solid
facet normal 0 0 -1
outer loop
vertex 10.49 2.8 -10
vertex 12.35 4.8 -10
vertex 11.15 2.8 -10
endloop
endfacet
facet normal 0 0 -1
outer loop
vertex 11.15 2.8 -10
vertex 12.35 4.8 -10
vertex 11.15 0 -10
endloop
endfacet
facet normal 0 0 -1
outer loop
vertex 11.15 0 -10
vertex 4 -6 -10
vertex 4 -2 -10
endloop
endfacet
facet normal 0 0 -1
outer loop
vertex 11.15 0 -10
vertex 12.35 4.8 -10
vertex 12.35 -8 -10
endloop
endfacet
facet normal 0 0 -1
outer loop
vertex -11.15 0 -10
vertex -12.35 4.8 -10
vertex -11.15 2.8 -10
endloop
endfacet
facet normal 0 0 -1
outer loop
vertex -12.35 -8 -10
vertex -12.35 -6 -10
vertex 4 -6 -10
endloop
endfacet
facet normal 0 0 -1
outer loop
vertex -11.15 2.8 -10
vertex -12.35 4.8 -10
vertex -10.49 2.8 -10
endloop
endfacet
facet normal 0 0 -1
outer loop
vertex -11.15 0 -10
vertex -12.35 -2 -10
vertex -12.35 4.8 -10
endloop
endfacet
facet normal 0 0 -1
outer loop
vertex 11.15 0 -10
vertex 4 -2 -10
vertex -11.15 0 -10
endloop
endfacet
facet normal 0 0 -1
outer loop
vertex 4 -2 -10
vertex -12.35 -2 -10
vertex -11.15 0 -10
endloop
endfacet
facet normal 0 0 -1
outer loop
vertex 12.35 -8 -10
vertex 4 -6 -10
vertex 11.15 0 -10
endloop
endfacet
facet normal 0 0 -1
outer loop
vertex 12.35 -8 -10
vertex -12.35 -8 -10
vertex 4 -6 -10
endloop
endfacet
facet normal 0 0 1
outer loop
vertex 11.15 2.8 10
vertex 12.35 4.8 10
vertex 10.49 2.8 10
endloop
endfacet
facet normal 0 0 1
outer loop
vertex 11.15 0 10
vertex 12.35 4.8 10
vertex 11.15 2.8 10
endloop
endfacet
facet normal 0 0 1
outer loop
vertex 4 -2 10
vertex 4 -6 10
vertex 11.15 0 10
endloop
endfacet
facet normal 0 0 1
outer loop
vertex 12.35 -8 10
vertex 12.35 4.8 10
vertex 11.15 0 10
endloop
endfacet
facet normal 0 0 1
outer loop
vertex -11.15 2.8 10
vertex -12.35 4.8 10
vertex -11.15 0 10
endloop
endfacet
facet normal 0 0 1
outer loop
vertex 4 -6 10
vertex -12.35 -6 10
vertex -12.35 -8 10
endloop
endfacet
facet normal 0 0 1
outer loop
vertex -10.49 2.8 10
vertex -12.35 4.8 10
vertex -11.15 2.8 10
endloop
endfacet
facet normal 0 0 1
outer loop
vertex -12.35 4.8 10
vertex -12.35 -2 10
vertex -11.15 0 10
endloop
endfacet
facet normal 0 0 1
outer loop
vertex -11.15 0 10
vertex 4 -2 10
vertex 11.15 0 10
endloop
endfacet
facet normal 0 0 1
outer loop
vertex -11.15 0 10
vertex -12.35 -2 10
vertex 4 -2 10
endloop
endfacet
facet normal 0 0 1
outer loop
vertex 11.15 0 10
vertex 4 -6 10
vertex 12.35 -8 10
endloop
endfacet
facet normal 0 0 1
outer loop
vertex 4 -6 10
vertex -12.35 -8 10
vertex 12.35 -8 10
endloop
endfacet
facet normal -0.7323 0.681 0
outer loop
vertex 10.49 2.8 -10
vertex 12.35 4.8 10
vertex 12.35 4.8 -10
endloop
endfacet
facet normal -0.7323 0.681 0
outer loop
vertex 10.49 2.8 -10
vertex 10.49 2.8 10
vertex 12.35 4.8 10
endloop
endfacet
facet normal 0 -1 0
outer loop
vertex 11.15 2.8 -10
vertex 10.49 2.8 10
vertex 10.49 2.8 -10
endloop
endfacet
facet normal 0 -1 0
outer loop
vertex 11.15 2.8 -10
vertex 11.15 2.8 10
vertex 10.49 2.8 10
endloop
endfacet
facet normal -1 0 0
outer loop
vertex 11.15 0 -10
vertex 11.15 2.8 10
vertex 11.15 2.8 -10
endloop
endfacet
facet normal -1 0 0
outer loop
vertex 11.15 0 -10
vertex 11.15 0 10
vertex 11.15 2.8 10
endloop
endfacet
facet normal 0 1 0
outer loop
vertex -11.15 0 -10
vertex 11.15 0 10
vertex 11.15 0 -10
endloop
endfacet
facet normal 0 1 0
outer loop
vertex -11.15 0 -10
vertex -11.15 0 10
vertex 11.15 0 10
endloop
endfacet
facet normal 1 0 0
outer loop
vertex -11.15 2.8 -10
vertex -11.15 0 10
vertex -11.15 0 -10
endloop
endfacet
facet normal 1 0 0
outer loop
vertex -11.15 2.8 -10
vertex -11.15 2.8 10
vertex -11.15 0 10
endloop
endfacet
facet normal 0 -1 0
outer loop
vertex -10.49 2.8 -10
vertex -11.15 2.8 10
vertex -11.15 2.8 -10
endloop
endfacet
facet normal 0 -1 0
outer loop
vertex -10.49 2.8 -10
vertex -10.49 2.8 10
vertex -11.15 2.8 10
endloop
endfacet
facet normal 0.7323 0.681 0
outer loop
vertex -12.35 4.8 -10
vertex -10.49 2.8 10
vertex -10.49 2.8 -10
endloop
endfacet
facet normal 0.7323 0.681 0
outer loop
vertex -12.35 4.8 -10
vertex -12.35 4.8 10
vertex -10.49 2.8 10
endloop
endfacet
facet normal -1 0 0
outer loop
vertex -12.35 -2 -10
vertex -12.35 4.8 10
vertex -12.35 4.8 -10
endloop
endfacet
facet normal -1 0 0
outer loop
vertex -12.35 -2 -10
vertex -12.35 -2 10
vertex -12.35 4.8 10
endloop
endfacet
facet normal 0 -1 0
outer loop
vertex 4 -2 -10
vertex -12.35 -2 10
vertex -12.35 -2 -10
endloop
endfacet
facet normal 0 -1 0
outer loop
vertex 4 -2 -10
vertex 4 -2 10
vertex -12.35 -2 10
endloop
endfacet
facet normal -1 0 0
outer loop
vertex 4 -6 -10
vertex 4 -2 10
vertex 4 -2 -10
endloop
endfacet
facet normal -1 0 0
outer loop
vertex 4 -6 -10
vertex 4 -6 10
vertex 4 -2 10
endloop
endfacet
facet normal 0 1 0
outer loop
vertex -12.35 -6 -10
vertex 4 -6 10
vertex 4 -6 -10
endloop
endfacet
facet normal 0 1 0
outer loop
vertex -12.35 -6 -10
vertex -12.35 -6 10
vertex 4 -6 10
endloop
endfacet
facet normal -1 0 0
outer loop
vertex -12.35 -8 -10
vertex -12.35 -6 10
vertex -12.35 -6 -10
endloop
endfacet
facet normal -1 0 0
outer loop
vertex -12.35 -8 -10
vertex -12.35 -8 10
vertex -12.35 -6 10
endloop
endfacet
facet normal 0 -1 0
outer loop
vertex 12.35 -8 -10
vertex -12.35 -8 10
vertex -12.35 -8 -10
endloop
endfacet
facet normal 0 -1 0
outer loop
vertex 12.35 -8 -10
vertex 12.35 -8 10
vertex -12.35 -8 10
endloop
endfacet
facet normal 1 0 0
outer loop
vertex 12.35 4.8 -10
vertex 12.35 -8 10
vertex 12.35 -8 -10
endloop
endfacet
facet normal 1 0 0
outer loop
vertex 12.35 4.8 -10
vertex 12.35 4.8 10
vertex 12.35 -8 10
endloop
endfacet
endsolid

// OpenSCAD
$fn=32;
width = 20;
channel_width = 22.3;
latch_height = 2;
overhang = 0.66;
wall_thickness = 2.8;
box_thickness = 2;
bottom_thickness = 3;
other_thickness = 2;

center_offset = 4;
mirror_thickness = 4;


outer_x = channel_width/2 + 1.2;
lowest_y = -box_thickness - mirror_thickness - other_thickness;

translate([0, 0, -width/2])
linear_extrude(width)
polygon([
[-outer_x, -box_thickness],
[-outer_x, wall_thickness + latch_height],
[-channel_width/2 + overhang, wall_thickness],
[-channel_width/2, wall_thickness],
[-channel_width/2, 0],
[channel_width/2, 0],
[channel_width/2, wall_thickness],
[channel_width/2 - overhang, wall_thickness],
[outer_x, wall_thickness + latch_height],
[outer_x, lowest_y],
[-outer_x, lowest_y],
[-outer_x, lowest_y + other_thickness],
[center_offset, lowest_y + other_thickness],
[center_offset, -box_thickness],
]);
